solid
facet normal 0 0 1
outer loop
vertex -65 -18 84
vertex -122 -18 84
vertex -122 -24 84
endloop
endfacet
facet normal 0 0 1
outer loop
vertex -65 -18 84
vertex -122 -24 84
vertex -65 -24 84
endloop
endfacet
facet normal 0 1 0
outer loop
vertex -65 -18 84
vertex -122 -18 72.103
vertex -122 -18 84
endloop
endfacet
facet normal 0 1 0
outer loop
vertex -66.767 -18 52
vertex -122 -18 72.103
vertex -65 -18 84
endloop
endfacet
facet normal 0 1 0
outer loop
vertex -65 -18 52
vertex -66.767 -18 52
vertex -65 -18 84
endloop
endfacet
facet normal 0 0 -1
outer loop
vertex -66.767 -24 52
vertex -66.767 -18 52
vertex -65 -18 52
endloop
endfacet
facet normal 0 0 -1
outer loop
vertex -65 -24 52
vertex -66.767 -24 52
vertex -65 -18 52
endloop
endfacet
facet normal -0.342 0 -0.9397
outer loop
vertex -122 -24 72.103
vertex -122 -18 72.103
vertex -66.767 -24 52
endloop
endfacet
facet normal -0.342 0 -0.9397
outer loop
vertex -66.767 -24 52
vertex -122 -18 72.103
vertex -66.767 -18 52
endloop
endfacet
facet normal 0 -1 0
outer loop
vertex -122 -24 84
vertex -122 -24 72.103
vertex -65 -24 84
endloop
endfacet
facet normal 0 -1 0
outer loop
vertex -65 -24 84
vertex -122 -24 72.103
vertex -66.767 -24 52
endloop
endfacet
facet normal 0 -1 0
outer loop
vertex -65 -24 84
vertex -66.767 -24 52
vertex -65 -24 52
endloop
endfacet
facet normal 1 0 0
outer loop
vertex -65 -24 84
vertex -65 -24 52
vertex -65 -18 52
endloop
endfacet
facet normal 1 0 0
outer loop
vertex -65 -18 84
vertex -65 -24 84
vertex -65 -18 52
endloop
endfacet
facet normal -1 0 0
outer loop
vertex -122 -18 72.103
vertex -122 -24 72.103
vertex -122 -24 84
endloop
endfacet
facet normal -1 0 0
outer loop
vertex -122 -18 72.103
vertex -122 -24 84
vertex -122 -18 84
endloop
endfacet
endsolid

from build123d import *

# Parameters (mm, degrees)
BOX728_W               = 80
BOX728_H               = 6
BOX728_DEPTH           = 20
BOX728_PLACEMENT_ANGLE = 20
BOX724_W               = 57
BOX724_H               = 6
BOX724_DEPTH           = 32


with BuildPart() as krychle728:
    # Box728 → Box728 (new body)
    with BuildSketch(Plane.XY):
        with Locations((40, 3)):
            Rectangle(BOX728_W, BOX728_H)
    extrude(amount=BOX728_DEPTH)


with BuildPart() as krychle728_1:
    # Box728 placement: moved
    add(krychle728.part.moved(Location((-131.7, -24, 54.35))).rotate(Axis((-131.7, -24, 54.35), (0, 1, 0)), BOX728_PLACEMENT_ANGLE))


with BuildPart() as cut531:
    # Box724 → Box724 (new body)
    with BuildSketch(Plane(origin=(-122, -24, 52), x_dir=(1, 0, 0), z_dir=(0, 0, 1))):
        with Locations((28.5, 3)):
            Rectangle(BOX724_W, BOX724_H)
    extrude(amount=BOX724_DEPTH)

    # Cut531: cut Krychle728
    add(krychle728_1.part, mode=Mode.SUBTRACT)


solid = cut531.part
